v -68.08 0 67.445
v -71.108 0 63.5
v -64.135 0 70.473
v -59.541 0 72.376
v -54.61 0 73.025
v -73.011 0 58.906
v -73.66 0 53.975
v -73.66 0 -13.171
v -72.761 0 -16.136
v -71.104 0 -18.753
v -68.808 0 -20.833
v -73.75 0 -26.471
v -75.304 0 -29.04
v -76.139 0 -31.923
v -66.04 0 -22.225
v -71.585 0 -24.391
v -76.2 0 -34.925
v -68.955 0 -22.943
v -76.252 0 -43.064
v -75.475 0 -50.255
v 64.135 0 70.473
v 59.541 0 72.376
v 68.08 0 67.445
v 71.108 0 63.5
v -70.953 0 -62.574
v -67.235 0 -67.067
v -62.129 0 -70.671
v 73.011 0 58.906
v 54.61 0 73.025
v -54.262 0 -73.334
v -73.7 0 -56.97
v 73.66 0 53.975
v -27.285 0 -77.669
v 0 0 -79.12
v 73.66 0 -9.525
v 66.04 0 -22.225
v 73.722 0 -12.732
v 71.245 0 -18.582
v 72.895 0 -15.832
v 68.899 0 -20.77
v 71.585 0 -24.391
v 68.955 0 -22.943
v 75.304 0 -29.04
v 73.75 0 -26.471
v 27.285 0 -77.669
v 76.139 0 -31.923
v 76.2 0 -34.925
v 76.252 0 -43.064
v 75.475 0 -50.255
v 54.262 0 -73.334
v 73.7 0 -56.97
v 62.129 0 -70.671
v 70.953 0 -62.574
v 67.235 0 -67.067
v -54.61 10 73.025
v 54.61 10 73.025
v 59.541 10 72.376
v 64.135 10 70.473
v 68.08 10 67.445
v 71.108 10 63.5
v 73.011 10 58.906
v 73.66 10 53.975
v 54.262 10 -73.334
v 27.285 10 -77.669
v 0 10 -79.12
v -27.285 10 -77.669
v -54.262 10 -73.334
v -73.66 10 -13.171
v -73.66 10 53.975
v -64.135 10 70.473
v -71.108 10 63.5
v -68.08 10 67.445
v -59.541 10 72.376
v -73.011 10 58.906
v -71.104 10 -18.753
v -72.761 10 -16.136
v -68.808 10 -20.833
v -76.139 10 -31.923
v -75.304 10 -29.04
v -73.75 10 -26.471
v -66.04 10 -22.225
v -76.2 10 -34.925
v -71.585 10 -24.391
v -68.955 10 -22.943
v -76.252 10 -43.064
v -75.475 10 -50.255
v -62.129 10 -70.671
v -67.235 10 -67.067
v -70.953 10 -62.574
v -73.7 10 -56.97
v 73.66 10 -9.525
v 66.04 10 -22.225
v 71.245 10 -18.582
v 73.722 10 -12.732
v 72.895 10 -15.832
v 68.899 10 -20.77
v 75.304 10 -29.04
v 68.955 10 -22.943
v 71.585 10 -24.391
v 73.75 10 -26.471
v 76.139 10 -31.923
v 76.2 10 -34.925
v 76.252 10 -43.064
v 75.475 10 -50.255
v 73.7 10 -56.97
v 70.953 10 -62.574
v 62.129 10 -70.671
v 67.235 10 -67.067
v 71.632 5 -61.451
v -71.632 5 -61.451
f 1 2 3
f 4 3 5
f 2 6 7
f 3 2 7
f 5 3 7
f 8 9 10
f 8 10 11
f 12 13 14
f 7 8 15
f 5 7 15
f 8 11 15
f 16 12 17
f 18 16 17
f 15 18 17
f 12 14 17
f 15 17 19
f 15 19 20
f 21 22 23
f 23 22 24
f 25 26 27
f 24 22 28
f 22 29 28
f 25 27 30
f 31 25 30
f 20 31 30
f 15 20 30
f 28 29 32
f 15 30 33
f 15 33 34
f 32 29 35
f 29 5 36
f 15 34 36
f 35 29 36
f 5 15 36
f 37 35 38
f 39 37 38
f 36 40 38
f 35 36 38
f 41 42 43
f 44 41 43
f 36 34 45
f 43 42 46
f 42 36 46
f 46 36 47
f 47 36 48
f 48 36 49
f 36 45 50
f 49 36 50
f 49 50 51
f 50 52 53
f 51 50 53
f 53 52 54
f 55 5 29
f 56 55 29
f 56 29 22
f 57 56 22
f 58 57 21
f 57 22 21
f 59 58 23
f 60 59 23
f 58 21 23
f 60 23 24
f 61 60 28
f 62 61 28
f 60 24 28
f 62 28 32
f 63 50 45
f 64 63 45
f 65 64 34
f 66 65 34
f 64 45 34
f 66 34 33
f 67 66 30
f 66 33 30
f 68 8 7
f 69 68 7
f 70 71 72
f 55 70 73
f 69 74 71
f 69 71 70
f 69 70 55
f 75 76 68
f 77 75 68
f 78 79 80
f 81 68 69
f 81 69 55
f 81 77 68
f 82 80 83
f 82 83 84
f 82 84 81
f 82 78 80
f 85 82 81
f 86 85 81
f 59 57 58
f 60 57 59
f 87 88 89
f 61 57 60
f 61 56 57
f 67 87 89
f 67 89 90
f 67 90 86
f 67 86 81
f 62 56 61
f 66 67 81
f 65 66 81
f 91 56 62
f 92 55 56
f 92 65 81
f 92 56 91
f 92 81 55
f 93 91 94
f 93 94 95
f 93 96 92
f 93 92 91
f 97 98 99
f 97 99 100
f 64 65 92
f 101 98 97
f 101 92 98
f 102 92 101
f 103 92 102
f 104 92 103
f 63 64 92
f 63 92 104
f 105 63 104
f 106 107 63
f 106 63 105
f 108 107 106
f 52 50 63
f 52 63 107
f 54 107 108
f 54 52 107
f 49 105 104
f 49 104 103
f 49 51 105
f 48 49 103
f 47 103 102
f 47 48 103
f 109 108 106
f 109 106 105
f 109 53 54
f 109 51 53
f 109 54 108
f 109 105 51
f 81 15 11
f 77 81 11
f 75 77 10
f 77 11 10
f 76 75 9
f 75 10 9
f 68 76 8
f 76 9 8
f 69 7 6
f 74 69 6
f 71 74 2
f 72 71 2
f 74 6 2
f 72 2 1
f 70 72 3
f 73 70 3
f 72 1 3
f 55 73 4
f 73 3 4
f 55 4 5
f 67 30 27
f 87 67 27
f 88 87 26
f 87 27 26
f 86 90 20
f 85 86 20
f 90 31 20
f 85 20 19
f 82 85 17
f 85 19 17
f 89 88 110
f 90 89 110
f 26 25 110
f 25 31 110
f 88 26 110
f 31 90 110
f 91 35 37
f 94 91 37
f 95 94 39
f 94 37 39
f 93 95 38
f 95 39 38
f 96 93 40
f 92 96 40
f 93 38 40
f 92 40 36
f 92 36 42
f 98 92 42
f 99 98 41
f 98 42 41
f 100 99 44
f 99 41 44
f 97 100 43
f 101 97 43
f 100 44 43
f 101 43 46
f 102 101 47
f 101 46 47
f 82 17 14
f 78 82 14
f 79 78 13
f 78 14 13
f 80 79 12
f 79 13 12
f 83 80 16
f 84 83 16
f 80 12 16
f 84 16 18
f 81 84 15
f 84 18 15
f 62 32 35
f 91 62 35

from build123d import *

# Parameters (mm, degrees)
BOSS_EXTRUDE1_DEPTH = 10


with BuildPart() as part:
    # Sketch2 → Boss-Extrude1 (new body)
    with BuildSketch(Plane(origin=(0, 0, 0), x_dir=(1, 0, 0), z_dir=(0, 1, 0))):
        with BuildLine():
            ThreePointArc((-76.2, 34.925), (-73.750256121, 26.470795103), (-66.04, 22.225))
            ThreePointArc((-66.04, 22.225), (-71.103893825, 18.75335434), (-73.66, 13.171090867))
            Line((-73.66, 13.171090867), (-73.66, -53.975))
            ThreePointArc((-73.66, -53.975), (-68.080384182, -67.445384182), (-54.61, -73.025))
            Line((-54.61, -73.025), (54.61, -73.025))
            ThreePointArc((54.61, -73.025), (68.080384182, -67.445384182), (73.66, -53.975))
            Line((73.66, -53.975), (73.66, 9.525))
            ThreePointArc((73.66, 9.525), (72.166535166, 17.2649211), (66.04, 22.225))
            ThreePointArc((66.04, 22.225), (73.750256121, 26.470795103), (76.2, 34.925))
            add(Edge.make_bspline(
                [(54.26154132, 73.334062346), (78.033661383, 68.772092229), (76.2, 34.925)],
                knots=[0, 0, 0, 1, 1, 1], degree=2))
            ThreePointArc((54.26154132, 73.334062346), (0, 79.119757765), (-54.26154132, 73.334062346))
            add(Edge.make_bspline(
                [(-54.26154132, 73.334062346), (-78.033661383, 68.772092229), (-76.2, 34.925)],
                knots=[0, 0, 0, 1, 1, 1], degree=2))
        make_face()
    extrude(amount=BOSS_EXTRUDE1_DEPTH)


solid = part.part
